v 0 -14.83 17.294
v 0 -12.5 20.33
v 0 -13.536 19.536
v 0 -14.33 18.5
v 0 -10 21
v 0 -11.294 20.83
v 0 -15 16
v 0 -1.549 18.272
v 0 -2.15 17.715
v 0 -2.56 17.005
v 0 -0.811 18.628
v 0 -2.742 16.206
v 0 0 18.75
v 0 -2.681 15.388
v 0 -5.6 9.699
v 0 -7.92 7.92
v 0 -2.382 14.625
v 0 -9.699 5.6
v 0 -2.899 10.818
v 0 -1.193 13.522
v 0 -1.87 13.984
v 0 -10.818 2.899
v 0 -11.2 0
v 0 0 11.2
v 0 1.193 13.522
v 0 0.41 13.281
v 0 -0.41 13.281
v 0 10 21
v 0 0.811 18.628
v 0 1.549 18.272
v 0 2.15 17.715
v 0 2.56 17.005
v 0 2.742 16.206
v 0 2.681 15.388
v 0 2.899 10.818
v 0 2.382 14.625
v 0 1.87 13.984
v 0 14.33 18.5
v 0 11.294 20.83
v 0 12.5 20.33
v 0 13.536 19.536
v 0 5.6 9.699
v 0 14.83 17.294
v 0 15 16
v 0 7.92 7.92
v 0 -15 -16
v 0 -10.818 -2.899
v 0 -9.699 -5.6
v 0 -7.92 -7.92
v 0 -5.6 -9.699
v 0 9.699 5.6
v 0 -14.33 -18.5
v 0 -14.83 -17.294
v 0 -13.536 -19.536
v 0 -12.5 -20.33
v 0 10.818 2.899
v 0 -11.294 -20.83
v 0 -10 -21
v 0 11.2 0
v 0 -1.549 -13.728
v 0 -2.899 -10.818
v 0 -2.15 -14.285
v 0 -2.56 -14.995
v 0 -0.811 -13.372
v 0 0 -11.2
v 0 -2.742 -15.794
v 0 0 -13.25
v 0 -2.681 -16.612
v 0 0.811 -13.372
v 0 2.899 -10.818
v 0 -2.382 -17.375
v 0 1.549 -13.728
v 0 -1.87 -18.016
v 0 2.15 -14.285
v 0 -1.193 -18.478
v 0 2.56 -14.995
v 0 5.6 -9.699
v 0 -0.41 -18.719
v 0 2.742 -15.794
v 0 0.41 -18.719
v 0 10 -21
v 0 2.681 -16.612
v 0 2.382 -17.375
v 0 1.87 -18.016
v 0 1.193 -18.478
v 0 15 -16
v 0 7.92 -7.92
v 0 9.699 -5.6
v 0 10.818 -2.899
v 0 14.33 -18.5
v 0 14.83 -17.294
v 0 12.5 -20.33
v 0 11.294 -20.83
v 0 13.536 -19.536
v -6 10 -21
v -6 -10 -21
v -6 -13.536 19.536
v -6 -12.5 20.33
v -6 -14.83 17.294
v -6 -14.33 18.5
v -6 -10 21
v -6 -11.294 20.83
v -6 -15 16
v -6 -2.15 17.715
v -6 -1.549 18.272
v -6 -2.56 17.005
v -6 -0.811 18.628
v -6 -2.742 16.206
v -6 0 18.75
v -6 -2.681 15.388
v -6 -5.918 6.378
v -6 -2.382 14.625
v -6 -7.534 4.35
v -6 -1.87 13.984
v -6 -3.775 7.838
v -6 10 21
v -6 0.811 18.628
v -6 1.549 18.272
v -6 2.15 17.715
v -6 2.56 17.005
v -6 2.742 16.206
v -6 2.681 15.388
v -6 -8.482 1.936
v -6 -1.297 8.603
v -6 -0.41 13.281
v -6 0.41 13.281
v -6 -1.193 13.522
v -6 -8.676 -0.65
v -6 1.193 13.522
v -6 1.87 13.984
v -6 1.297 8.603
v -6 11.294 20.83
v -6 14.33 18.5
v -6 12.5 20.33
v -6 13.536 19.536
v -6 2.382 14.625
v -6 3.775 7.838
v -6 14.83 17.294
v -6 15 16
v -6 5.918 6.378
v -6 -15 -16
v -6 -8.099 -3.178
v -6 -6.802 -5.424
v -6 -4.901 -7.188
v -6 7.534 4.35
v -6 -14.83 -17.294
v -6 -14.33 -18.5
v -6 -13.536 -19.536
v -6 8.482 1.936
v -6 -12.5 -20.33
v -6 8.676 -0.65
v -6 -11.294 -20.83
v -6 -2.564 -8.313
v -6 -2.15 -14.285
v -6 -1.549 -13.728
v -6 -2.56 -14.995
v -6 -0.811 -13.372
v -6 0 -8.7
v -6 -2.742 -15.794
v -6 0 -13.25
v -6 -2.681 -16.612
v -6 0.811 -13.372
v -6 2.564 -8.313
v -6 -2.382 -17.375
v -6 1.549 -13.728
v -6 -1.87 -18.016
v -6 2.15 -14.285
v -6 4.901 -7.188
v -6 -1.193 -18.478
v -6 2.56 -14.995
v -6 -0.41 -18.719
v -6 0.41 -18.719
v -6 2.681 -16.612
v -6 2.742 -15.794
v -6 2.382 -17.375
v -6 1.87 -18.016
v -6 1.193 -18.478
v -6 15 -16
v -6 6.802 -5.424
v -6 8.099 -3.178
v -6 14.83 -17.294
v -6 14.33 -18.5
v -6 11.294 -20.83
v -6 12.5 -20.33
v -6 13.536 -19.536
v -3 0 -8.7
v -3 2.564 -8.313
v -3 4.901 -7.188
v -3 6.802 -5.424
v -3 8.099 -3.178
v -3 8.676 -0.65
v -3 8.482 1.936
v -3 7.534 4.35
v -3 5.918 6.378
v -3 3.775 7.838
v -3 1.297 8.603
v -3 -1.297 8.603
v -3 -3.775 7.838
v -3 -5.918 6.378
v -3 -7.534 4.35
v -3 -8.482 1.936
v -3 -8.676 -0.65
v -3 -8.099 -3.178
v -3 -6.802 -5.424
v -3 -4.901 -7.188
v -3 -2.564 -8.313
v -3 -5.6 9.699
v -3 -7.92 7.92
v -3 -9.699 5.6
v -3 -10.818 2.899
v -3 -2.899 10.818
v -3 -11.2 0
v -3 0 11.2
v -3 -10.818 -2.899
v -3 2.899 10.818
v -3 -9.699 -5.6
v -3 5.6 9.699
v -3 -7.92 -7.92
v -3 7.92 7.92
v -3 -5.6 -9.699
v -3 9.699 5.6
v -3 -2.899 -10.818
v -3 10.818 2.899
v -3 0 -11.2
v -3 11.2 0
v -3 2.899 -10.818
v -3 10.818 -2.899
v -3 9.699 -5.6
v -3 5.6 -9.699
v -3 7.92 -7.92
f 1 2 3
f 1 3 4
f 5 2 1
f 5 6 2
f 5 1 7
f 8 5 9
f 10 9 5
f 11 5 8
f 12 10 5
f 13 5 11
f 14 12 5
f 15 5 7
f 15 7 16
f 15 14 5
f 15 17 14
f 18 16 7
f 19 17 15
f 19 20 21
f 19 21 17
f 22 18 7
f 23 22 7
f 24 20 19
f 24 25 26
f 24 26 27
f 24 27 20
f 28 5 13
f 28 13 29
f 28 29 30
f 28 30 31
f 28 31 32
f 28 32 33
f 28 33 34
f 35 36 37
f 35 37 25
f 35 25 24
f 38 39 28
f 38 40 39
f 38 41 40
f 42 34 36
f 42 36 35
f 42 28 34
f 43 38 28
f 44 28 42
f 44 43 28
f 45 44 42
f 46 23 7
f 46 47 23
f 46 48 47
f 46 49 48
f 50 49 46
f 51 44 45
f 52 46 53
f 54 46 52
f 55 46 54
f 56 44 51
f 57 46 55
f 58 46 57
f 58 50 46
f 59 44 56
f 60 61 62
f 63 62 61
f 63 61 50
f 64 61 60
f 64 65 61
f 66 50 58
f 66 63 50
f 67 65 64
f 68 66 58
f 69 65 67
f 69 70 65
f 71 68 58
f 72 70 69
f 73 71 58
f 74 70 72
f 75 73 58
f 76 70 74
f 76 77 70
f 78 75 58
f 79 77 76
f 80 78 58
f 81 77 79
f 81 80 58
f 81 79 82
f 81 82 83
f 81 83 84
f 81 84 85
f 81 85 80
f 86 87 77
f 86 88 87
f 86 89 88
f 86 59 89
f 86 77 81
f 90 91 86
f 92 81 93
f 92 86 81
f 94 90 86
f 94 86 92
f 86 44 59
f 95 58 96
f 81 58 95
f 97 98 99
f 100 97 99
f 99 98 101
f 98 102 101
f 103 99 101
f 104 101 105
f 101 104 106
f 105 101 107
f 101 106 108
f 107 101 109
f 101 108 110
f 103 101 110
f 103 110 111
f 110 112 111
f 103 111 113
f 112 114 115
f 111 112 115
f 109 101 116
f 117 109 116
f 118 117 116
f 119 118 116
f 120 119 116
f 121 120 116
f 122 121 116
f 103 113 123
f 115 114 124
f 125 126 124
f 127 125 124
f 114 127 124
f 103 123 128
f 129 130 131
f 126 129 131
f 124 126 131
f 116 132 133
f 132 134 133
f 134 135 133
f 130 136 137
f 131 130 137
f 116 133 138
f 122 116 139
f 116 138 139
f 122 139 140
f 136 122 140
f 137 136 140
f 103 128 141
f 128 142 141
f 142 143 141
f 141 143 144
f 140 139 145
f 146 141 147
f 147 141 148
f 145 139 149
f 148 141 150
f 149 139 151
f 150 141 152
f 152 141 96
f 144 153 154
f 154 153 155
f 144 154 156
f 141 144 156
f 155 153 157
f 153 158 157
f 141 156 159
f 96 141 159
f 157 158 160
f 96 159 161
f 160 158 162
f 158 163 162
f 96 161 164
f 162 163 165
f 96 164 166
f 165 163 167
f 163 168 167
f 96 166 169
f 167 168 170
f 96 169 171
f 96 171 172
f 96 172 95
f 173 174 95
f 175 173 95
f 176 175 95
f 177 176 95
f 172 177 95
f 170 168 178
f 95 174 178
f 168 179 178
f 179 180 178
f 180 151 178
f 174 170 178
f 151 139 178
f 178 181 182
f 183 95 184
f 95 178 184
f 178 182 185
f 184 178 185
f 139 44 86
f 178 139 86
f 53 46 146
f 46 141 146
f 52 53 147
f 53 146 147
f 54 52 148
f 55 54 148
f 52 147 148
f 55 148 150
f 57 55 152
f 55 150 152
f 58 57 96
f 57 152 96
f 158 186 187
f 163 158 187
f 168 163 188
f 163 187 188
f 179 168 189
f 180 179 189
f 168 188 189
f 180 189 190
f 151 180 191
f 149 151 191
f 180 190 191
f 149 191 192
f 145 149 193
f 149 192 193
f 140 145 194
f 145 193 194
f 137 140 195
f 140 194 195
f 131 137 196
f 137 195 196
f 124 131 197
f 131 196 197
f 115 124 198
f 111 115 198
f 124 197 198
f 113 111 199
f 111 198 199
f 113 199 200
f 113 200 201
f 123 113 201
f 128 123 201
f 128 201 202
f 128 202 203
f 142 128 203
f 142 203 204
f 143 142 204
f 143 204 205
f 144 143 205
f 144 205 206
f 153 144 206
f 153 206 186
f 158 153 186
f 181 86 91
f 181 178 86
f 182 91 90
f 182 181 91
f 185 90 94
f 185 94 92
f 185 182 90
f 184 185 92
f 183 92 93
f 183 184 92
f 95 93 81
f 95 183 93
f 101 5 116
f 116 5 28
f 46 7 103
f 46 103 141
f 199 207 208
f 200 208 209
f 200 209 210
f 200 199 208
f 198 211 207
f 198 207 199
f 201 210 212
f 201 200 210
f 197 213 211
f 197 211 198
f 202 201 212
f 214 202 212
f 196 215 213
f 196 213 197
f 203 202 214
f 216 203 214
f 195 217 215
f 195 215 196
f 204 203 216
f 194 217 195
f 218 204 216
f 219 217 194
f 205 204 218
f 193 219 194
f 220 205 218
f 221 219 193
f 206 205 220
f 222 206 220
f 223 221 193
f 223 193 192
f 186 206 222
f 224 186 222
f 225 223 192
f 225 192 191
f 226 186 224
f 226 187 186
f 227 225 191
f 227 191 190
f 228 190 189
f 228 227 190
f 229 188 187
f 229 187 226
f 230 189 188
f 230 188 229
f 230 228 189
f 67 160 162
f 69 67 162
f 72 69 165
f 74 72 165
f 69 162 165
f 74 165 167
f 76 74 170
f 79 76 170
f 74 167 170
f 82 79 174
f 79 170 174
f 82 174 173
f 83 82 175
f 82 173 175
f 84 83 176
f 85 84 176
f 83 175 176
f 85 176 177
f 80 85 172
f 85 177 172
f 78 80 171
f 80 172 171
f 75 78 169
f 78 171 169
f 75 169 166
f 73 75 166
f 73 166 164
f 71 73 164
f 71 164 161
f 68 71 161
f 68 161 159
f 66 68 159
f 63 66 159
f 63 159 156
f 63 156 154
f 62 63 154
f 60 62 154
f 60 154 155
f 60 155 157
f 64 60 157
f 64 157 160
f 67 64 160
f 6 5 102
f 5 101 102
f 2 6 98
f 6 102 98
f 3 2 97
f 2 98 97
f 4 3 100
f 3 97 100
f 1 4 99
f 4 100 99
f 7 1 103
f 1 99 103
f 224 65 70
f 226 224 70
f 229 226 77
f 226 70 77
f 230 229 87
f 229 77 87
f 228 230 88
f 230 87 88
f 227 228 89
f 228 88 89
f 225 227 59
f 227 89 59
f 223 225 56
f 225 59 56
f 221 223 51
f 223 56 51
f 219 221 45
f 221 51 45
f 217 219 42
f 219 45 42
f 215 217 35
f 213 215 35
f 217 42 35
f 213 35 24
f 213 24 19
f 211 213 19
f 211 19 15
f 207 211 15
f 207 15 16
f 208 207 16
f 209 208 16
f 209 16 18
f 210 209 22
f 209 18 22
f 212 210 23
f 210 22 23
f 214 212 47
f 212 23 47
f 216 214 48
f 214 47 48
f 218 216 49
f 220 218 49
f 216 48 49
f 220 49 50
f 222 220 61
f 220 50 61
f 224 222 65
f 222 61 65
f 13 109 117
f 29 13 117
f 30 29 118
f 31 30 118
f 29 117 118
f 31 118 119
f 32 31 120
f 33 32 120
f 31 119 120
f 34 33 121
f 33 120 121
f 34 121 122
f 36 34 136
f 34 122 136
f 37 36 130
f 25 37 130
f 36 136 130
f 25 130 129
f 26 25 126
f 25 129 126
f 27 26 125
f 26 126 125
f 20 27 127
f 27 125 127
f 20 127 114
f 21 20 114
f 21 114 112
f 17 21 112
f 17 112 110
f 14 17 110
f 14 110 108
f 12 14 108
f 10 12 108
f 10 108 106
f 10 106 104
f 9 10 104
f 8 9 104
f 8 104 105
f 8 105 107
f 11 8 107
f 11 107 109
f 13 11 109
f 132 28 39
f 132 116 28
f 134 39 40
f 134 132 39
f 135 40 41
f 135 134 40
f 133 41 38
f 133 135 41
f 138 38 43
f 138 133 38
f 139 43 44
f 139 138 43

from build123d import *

# Parameters (mm, degrees)
SKIZZE1_W                        = 42
SKIZZE1_H                        = 30
AUFSATZ_LINEAR_AUSTRAGEN1_DEPTH  = 6
SKIZZE1_3_R                      = 8.7
SCHNITT_LINEAR_AUSTRAGEN1_DEPTH  = 6
SKIZZE1_4_R                      = 11.2
SCHNITT_LINEAR_AUSTRAGEN2_DEPTH  = 3
F_5_5_5_5_DURCHMESSER_BOHRUNG1_D = 5.5
VERRUNDUNG1_R                    = 5


with BuildPart() as part:
    # Skizze1 → Aufsatz-Linear austragen1 (new body)
    with BuildSketch(Plane(origin=(0, 0, 0), x_dir=(0, 0, -1), z_dir=(1, 0, 0))):
        Rectangle(SKIZZE1_W, SKIZZE1_H)
    extrude(amount=-AUFSATZ_LINEAR_AUSTRAGEN1_DEPTH)

    # Skizze1<3> → Schnitt-Linear austragen1 (cut)
    with BuildSketch(Plane(origin=(0, 0, 0), x_dir=(0, 0, -1), z_dir=(1, 0, 0))):
        Circle(SKIZZE1_3_R)
    extrude(amount=-SCHNITT_LINEAR_AUSTRAGEN1_DEPTH, mode=Mode.SUBTRACT)

    # Skizze1<4> → Schnitt-Linear austragen2 (cut)
    with BuildSketch(Plane(origin=(0, 0, 0), x_dir=(0, 0, -1), z_dir=(1, 0, 0))):
        Circle(SKIZZE1_4_R)
    extrude(amount=-SCHNITT_LINEAR_AUSTRAGEN2_DEPTH, mode=Mode.SUBTRACT)

    # Ø5.5 (5.5) Durchmesser Bohrung1 (through all)
    with Locations(Plane(origin=(0, 0, 0), x_dir=(0, 0, -1), z_dir=(1, 0, 0))):
        with Locations((-16, 0), (16, 0)):
            Hole(F_5_5_5_5_DURCHMESSER_BOHRUNG1_D / 2)

    # Verrundung1
    verrundung1_edges = [part.edges().sort_by_distance(p)[0] for p in [
        (-3, -15, -21),
        (-3, -15, 21),
        (-3, 15, 21),
        (-3, 15, -21),
    ]]
    fillet(verrundung1_edges, radius=VERRUNDUNG1_R)


solid = part.part
